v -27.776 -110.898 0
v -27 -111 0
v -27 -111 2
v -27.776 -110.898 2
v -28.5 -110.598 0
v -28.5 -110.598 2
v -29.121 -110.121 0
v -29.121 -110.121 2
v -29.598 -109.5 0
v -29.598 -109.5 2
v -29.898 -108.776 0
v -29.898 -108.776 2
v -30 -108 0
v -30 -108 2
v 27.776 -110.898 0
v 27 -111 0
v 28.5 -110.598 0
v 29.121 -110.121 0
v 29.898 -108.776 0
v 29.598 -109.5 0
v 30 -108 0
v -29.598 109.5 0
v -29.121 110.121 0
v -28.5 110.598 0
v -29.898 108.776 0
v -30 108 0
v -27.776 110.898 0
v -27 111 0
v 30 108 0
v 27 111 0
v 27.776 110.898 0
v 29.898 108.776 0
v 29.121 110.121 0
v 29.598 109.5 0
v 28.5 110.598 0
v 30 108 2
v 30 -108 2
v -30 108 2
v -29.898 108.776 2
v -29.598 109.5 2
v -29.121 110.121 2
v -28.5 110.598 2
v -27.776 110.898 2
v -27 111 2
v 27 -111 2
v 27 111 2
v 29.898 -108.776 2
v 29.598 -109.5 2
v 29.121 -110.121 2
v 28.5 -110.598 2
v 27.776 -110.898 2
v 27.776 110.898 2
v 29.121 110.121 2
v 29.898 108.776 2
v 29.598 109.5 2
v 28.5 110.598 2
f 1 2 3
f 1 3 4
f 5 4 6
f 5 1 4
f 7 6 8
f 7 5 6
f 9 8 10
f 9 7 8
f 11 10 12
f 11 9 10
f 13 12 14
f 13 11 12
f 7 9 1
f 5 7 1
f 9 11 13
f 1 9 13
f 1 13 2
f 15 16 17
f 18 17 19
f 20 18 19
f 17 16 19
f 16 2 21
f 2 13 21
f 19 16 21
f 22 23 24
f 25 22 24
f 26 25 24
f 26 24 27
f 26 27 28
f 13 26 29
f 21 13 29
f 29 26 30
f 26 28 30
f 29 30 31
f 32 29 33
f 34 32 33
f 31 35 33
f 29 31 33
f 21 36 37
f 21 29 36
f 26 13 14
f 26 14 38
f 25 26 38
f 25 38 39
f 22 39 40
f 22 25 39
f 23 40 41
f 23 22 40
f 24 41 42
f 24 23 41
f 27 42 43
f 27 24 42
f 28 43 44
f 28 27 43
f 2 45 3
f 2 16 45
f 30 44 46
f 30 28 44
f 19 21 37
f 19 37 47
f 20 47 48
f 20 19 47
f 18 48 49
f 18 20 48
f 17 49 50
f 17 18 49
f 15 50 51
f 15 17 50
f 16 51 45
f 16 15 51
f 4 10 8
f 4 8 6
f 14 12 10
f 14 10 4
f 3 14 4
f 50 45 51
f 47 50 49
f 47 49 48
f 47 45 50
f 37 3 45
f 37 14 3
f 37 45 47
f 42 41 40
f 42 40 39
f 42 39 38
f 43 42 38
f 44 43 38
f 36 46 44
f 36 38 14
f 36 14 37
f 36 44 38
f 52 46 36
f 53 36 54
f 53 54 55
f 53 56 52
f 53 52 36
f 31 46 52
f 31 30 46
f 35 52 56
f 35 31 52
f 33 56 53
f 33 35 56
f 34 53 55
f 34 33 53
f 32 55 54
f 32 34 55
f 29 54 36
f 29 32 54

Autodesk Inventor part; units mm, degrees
ref_plane "YZ Plane" through (0, 0, 0) normal (1, 0, 0) x (0, 1, 0)
ref_plane "XZ Plane" through (0, 0, 0) normal (0, 1, 0) x (-1, 0, 0)
ref_plane "XY Plane" through (0, 0, 0) normal (0, 0, 1) x (1, 0, 0)
sketch "Эскиз1" plane through (0, 0, 0) normal (0, 0, 1) x (1, 0, 0)
  line L0 (-27, 111) -> (27, 111)
  line L1 (30, 108) -> (30, -108)
  line L2 (27, -111) -> (-27, -111)
  line L3 (-30, -108) -> (-30, 108)
  line L4 (0, -156.2698) -> (0, 156.2698) projected
  line L5 (-42.8698, 0) -> (42.8698, 0) projected
  arc A0 (-27, 111) -> (-30, 108) centre (-27, 108) ccw
  arc A1 (30, 108) -> (27, 111) centre (27, 108) ccw
  arc A2 (27, -111) -> (30, -108) centre (27, -108) ccw
  arc A3 (-30, -108) -> (-27, -111) centre (-27, -108) ccw
  point P0 (0, 0)
  dimension "d0" = 60
  dimension "d1" = 222
  dimension "d2" = 3
extrude "Выдавливание1" add sketch "Эскиз1" along normal blind 2
sketch "Эскиз2" plane through (0, 0, 2) normal (0, 0, 1) x (1, 0, 0)
  line L0 (-25, 106) -> (25, 106)
  line L1 (25, 106) -> (25, -106)
  line L2 (25, -106) -> (-25, -106)
  line L3 (-25, -106) -> (-25, 106)
  line L4 (-30, 108) -> (-30, -108) projected
  line L5 (30, -108) -> (30, 108) projected
  line L6 (27, 111) -> (-27, 111) projected
  line L7 (-27, -111) -> (27, -111) projected
  point P0 (0, 0)
  dimension "d5" = 5
  dimension "d6" = 5
  dimension "d7" = 5
  dimension "d8" = 5
properties part number "контроль"
